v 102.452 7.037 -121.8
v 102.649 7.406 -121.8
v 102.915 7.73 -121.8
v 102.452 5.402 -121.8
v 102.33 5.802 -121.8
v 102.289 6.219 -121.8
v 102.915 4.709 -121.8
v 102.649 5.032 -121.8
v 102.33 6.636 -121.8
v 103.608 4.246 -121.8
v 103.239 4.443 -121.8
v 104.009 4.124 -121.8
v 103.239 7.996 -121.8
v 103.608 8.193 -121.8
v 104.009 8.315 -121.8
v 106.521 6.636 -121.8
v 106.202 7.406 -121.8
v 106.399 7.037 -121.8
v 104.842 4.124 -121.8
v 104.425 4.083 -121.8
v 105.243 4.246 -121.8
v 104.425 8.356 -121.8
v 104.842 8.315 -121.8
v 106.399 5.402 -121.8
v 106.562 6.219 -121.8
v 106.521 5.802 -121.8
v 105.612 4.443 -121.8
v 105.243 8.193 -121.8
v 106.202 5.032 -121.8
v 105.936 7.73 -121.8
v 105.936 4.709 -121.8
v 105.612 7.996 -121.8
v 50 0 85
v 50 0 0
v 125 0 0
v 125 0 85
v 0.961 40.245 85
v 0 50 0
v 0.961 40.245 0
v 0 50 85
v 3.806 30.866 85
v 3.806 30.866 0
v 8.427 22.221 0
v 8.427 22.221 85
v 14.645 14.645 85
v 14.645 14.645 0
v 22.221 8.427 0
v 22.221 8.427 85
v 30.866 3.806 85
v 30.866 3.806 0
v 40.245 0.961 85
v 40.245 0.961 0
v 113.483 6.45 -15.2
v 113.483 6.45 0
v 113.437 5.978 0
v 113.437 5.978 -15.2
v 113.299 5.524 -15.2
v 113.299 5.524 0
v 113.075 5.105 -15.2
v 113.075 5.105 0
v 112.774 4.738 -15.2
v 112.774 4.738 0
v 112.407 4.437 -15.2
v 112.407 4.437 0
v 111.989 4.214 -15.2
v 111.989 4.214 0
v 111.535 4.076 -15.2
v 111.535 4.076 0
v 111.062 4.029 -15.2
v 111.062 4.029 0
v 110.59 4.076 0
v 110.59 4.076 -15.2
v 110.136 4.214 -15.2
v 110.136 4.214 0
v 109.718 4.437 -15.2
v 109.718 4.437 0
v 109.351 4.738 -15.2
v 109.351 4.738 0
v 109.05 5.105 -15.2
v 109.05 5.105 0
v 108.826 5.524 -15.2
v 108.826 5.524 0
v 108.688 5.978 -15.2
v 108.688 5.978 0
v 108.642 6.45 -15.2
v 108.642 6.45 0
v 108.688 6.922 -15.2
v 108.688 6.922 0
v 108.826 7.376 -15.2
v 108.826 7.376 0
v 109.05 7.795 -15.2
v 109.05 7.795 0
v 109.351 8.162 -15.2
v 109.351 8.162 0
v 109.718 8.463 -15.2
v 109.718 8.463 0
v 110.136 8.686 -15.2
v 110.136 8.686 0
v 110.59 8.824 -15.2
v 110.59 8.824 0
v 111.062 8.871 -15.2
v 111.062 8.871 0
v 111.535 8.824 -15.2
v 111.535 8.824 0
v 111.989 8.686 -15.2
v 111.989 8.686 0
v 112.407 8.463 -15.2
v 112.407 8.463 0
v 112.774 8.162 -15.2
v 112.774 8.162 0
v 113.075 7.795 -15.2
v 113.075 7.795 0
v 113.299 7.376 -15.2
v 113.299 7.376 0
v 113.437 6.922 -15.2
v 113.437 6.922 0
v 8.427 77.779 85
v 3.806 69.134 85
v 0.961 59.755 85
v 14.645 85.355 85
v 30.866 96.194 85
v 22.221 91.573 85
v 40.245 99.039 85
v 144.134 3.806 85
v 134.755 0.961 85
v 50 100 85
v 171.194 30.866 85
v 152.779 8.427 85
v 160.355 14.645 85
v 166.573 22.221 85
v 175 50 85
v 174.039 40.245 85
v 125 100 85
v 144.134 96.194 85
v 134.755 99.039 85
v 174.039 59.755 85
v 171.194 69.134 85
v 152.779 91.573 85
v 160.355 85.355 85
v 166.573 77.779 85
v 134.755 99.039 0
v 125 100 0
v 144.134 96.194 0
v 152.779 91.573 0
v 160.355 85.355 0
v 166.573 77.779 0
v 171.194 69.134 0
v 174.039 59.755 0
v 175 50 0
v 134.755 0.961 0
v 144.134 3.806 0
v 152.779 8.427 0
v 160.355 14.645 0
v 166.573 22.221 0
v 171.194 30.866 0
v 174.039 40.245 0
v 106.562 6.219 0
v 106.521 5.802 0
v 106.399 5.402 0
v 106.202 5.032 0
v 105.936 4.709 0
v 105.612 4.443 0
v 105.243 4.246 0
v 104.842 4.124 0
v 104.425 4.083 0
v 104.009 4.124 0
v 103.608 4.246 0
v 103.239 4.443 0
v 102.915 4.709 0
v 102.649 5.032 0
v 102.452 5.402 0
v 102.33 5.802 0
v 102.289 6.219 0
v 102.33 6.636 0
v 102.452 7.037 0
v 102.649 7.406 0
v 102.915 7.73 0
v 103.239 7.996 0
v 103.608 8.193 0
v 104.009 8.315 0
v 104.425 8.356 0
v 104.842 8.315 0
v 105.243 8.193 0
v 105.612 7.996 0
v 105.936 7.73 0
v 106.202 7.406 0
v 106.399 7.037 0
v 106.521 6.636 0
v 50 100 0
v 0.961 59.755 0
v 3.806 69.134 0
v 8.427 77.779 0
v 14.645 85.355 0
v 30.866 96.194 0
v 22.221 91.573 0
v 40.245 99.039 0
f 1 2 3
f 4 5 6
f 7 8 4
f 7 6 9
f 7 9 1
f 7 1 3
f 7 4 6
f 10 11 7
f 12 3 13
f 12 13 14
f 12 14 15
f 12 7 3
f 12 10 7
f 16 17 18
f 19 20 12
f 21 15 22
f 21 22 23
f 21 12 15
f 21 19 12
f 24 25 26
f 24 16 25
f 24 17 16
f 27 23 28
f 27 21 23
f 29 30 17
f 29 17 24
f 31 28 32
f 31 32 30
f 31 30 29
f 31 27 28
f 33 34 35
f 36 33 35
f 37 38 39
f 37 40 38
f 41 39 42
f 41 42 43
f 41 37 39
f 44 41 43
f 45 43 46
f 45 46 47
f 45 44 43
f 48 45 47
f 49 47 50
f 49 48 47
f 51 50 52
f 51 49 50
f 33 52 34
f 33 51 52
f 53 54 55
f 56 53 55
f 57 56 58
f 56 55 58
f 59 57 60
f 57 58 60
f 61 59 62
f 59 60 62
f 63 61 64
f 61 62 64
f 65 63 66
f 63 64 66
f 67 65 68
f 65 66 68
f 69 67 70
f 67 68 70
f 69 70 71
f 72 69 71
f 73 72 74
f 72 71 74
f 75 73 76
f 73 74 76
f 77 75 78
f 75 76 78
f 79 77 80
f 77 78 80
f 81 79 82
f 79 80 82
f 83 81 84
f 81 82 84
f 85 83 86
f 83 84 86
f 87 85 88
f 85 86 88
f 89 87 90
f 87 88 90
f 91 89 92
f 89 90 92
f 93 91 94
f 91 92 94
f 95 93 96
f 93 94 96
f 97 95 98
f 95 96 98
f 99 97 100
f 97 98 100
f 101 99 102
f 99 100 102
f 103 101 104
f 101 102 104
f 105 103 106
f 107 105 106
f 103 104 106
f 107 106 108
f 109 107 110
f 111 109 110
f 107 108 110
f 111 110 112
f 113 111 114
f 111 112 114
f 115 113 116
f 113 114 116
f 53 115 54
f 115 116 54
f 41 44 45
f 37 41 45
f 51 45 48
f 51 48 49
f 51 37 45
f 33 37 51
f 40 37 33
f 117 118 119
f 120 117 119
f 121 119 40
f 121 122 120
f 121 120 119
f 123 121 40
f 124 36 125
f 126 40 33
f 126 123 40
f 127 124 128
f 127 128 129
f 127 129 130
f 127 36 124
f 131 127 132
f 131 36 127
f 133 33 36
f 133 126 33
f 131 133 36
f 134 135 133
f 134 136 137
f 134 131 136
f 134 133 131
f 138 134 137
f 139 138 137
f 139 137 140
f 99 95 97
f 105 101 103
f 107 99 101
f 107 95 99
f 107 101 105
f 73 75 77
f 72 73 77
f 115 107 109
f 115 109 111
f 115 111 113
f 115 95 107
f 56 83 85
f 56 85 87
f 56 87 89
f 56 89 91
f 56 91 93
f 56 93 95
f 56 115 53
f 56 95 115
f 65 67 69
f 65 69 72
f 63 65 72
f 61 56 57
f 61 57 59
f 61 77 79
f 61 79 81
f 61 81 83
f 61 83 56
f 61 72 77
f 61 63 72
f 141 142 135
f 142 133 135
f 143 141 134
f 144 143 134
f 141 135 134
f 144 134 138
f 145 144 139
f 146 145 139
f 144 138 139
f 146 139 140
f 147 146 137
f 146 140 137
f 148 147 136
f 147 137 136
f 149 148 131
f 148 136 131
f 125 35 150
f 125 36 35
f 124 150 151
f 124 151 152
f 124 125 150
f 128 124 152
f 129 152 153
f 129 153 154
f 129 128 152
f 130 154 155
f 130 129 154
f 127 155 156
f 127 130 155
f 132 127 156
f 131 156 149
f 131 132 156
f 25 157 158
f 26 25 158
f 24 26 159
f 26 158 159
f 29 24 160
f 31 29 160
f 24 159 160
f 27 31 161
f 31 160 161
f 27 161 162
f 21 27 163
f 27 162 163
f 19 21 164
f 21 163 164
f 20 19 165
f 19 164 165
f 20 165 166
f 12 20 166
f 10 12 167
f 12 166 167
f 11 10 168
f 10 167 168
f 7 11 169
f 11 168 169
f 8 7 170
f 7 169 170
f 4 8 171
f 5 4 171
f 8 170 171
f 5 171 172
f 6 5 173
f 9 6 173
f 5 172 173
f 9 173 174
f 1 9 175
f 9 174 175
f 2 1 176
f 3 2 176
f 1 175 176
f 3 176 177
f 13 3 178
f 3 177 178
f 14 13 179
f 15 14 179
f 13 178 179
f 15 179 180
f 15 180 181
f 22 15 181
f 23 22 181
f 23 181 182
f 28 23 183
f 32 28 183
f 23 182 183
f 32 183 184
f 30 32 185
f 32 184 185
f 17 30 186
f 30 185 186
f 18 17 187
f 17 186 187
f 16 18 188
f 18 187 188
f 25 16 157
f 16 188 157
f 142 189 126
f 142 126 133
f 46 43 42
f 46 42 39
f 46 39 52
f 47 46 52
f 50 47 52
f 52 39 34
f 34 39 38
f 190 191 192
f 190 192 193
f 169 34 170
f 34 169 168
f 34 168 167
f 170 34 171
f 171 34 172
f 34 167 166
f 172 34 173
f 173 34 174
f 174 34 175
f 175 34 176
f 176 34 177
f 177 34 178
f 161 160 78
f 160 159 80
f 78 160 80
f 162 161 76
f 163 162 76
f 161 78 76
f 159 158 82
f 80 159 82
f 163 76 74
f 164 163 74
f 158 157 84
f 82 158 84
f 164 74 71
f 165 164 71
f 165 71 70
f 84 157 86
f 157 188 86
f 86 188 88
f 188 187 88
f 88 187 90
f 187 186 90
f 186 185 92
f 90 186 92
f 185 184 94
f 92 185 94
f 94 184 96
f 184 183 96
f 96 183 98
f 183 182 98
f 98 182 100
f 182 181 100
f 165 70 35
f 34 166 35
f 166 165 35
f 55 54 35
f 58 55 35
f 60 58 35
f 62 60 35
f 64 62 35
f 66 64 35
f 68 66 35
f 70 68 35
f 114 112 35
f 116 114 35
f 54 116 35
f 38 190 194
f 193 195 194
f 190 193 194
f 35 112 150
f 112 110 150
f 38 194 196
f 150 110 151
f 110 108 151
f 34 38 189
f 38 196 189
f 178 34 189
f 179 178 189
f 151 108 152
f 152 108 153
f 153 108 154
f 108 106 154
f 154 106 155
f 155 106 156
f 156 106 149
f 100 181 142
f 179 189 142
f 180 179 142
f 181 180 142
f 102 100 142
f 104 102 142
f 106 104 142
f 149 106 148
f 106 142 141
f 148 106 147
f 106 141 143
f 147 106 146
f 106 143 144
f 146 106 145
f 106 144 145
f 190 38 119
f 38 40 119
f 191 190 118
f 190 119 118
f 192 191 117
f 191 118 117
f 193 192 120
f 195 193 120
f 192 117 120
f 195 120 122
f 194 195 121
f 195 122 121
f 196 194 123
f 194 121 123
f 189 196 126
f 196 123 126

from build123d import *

# Parameters (mm, degrees)
F0_W     = 175
F0_H     = 100
F1_DEPTH = 85
F2_R     = 49.99999
F3_R     = 49.99999
F6_R     = 2.4206343252
F7_DEPTH = 15.2
F8_R     = 2.136311852
F9_DEPTH = 121.8


# Not quite as in the source:
# - a fillet or chamfer is up to 0.001 mm smaller than in the source, because OpenCascade refuses the exact size
# - the program builds the solid bodies; features that only make, move or delete a surface that nothing else refers to are left out


with BuildPart() as f1:
    # F0 (on Top) → F1 (new body)
    with BuildSketch(Plane.XY):
        with Locations((87.5, 50)):
            Rectangle(F0_W, F0_H)
    extrude(amount=F1_DEPTH)

    # F2 (radius 50 in the source; OpenCascade refuses exactly that, so slightly less here)
    f2_edges = [f1.edges().sort_by_distance(p)[0] for p in [
        (0, 0, 42.5),
        (0, 100, 42.5),
    ]]
    fillet(f2_edges, radius=F2_R)

    # F3 (radius 50 in the source; OpenCascade refuses exactly that, so slightly less here)
    f3_edges = [f1.edges().sort_by_distance(p)[0] for p in [
        (175, 100, 42.5),
        (175, 0, 42.5),
    ]]
    fillet(f3_edges, radius=F3_R)

    # F6 (on face) → F7 (join)
    with BuildSketch(Plane(origin=(0, 0, 0), x_dir=(1, 0, 0), z_dir=(0, 0, -1))):
        with Locations((111.062400043, -6.450037472)):
            Circle(F6_R)
    extrude(amount=F7_DEPTH)

    # F8 (on face) → F9 (join)
    with BuildSketch(Plane(origin=(0, 0, 0), x_dir=(1, 0, 0), z_dir=(0, 0, -1))):
        with Locations((104.4254601002, -6.2192697078)):
            Circle(F8_R)
    extrude(amount=F9_DEPTH)


solid = f1.part
